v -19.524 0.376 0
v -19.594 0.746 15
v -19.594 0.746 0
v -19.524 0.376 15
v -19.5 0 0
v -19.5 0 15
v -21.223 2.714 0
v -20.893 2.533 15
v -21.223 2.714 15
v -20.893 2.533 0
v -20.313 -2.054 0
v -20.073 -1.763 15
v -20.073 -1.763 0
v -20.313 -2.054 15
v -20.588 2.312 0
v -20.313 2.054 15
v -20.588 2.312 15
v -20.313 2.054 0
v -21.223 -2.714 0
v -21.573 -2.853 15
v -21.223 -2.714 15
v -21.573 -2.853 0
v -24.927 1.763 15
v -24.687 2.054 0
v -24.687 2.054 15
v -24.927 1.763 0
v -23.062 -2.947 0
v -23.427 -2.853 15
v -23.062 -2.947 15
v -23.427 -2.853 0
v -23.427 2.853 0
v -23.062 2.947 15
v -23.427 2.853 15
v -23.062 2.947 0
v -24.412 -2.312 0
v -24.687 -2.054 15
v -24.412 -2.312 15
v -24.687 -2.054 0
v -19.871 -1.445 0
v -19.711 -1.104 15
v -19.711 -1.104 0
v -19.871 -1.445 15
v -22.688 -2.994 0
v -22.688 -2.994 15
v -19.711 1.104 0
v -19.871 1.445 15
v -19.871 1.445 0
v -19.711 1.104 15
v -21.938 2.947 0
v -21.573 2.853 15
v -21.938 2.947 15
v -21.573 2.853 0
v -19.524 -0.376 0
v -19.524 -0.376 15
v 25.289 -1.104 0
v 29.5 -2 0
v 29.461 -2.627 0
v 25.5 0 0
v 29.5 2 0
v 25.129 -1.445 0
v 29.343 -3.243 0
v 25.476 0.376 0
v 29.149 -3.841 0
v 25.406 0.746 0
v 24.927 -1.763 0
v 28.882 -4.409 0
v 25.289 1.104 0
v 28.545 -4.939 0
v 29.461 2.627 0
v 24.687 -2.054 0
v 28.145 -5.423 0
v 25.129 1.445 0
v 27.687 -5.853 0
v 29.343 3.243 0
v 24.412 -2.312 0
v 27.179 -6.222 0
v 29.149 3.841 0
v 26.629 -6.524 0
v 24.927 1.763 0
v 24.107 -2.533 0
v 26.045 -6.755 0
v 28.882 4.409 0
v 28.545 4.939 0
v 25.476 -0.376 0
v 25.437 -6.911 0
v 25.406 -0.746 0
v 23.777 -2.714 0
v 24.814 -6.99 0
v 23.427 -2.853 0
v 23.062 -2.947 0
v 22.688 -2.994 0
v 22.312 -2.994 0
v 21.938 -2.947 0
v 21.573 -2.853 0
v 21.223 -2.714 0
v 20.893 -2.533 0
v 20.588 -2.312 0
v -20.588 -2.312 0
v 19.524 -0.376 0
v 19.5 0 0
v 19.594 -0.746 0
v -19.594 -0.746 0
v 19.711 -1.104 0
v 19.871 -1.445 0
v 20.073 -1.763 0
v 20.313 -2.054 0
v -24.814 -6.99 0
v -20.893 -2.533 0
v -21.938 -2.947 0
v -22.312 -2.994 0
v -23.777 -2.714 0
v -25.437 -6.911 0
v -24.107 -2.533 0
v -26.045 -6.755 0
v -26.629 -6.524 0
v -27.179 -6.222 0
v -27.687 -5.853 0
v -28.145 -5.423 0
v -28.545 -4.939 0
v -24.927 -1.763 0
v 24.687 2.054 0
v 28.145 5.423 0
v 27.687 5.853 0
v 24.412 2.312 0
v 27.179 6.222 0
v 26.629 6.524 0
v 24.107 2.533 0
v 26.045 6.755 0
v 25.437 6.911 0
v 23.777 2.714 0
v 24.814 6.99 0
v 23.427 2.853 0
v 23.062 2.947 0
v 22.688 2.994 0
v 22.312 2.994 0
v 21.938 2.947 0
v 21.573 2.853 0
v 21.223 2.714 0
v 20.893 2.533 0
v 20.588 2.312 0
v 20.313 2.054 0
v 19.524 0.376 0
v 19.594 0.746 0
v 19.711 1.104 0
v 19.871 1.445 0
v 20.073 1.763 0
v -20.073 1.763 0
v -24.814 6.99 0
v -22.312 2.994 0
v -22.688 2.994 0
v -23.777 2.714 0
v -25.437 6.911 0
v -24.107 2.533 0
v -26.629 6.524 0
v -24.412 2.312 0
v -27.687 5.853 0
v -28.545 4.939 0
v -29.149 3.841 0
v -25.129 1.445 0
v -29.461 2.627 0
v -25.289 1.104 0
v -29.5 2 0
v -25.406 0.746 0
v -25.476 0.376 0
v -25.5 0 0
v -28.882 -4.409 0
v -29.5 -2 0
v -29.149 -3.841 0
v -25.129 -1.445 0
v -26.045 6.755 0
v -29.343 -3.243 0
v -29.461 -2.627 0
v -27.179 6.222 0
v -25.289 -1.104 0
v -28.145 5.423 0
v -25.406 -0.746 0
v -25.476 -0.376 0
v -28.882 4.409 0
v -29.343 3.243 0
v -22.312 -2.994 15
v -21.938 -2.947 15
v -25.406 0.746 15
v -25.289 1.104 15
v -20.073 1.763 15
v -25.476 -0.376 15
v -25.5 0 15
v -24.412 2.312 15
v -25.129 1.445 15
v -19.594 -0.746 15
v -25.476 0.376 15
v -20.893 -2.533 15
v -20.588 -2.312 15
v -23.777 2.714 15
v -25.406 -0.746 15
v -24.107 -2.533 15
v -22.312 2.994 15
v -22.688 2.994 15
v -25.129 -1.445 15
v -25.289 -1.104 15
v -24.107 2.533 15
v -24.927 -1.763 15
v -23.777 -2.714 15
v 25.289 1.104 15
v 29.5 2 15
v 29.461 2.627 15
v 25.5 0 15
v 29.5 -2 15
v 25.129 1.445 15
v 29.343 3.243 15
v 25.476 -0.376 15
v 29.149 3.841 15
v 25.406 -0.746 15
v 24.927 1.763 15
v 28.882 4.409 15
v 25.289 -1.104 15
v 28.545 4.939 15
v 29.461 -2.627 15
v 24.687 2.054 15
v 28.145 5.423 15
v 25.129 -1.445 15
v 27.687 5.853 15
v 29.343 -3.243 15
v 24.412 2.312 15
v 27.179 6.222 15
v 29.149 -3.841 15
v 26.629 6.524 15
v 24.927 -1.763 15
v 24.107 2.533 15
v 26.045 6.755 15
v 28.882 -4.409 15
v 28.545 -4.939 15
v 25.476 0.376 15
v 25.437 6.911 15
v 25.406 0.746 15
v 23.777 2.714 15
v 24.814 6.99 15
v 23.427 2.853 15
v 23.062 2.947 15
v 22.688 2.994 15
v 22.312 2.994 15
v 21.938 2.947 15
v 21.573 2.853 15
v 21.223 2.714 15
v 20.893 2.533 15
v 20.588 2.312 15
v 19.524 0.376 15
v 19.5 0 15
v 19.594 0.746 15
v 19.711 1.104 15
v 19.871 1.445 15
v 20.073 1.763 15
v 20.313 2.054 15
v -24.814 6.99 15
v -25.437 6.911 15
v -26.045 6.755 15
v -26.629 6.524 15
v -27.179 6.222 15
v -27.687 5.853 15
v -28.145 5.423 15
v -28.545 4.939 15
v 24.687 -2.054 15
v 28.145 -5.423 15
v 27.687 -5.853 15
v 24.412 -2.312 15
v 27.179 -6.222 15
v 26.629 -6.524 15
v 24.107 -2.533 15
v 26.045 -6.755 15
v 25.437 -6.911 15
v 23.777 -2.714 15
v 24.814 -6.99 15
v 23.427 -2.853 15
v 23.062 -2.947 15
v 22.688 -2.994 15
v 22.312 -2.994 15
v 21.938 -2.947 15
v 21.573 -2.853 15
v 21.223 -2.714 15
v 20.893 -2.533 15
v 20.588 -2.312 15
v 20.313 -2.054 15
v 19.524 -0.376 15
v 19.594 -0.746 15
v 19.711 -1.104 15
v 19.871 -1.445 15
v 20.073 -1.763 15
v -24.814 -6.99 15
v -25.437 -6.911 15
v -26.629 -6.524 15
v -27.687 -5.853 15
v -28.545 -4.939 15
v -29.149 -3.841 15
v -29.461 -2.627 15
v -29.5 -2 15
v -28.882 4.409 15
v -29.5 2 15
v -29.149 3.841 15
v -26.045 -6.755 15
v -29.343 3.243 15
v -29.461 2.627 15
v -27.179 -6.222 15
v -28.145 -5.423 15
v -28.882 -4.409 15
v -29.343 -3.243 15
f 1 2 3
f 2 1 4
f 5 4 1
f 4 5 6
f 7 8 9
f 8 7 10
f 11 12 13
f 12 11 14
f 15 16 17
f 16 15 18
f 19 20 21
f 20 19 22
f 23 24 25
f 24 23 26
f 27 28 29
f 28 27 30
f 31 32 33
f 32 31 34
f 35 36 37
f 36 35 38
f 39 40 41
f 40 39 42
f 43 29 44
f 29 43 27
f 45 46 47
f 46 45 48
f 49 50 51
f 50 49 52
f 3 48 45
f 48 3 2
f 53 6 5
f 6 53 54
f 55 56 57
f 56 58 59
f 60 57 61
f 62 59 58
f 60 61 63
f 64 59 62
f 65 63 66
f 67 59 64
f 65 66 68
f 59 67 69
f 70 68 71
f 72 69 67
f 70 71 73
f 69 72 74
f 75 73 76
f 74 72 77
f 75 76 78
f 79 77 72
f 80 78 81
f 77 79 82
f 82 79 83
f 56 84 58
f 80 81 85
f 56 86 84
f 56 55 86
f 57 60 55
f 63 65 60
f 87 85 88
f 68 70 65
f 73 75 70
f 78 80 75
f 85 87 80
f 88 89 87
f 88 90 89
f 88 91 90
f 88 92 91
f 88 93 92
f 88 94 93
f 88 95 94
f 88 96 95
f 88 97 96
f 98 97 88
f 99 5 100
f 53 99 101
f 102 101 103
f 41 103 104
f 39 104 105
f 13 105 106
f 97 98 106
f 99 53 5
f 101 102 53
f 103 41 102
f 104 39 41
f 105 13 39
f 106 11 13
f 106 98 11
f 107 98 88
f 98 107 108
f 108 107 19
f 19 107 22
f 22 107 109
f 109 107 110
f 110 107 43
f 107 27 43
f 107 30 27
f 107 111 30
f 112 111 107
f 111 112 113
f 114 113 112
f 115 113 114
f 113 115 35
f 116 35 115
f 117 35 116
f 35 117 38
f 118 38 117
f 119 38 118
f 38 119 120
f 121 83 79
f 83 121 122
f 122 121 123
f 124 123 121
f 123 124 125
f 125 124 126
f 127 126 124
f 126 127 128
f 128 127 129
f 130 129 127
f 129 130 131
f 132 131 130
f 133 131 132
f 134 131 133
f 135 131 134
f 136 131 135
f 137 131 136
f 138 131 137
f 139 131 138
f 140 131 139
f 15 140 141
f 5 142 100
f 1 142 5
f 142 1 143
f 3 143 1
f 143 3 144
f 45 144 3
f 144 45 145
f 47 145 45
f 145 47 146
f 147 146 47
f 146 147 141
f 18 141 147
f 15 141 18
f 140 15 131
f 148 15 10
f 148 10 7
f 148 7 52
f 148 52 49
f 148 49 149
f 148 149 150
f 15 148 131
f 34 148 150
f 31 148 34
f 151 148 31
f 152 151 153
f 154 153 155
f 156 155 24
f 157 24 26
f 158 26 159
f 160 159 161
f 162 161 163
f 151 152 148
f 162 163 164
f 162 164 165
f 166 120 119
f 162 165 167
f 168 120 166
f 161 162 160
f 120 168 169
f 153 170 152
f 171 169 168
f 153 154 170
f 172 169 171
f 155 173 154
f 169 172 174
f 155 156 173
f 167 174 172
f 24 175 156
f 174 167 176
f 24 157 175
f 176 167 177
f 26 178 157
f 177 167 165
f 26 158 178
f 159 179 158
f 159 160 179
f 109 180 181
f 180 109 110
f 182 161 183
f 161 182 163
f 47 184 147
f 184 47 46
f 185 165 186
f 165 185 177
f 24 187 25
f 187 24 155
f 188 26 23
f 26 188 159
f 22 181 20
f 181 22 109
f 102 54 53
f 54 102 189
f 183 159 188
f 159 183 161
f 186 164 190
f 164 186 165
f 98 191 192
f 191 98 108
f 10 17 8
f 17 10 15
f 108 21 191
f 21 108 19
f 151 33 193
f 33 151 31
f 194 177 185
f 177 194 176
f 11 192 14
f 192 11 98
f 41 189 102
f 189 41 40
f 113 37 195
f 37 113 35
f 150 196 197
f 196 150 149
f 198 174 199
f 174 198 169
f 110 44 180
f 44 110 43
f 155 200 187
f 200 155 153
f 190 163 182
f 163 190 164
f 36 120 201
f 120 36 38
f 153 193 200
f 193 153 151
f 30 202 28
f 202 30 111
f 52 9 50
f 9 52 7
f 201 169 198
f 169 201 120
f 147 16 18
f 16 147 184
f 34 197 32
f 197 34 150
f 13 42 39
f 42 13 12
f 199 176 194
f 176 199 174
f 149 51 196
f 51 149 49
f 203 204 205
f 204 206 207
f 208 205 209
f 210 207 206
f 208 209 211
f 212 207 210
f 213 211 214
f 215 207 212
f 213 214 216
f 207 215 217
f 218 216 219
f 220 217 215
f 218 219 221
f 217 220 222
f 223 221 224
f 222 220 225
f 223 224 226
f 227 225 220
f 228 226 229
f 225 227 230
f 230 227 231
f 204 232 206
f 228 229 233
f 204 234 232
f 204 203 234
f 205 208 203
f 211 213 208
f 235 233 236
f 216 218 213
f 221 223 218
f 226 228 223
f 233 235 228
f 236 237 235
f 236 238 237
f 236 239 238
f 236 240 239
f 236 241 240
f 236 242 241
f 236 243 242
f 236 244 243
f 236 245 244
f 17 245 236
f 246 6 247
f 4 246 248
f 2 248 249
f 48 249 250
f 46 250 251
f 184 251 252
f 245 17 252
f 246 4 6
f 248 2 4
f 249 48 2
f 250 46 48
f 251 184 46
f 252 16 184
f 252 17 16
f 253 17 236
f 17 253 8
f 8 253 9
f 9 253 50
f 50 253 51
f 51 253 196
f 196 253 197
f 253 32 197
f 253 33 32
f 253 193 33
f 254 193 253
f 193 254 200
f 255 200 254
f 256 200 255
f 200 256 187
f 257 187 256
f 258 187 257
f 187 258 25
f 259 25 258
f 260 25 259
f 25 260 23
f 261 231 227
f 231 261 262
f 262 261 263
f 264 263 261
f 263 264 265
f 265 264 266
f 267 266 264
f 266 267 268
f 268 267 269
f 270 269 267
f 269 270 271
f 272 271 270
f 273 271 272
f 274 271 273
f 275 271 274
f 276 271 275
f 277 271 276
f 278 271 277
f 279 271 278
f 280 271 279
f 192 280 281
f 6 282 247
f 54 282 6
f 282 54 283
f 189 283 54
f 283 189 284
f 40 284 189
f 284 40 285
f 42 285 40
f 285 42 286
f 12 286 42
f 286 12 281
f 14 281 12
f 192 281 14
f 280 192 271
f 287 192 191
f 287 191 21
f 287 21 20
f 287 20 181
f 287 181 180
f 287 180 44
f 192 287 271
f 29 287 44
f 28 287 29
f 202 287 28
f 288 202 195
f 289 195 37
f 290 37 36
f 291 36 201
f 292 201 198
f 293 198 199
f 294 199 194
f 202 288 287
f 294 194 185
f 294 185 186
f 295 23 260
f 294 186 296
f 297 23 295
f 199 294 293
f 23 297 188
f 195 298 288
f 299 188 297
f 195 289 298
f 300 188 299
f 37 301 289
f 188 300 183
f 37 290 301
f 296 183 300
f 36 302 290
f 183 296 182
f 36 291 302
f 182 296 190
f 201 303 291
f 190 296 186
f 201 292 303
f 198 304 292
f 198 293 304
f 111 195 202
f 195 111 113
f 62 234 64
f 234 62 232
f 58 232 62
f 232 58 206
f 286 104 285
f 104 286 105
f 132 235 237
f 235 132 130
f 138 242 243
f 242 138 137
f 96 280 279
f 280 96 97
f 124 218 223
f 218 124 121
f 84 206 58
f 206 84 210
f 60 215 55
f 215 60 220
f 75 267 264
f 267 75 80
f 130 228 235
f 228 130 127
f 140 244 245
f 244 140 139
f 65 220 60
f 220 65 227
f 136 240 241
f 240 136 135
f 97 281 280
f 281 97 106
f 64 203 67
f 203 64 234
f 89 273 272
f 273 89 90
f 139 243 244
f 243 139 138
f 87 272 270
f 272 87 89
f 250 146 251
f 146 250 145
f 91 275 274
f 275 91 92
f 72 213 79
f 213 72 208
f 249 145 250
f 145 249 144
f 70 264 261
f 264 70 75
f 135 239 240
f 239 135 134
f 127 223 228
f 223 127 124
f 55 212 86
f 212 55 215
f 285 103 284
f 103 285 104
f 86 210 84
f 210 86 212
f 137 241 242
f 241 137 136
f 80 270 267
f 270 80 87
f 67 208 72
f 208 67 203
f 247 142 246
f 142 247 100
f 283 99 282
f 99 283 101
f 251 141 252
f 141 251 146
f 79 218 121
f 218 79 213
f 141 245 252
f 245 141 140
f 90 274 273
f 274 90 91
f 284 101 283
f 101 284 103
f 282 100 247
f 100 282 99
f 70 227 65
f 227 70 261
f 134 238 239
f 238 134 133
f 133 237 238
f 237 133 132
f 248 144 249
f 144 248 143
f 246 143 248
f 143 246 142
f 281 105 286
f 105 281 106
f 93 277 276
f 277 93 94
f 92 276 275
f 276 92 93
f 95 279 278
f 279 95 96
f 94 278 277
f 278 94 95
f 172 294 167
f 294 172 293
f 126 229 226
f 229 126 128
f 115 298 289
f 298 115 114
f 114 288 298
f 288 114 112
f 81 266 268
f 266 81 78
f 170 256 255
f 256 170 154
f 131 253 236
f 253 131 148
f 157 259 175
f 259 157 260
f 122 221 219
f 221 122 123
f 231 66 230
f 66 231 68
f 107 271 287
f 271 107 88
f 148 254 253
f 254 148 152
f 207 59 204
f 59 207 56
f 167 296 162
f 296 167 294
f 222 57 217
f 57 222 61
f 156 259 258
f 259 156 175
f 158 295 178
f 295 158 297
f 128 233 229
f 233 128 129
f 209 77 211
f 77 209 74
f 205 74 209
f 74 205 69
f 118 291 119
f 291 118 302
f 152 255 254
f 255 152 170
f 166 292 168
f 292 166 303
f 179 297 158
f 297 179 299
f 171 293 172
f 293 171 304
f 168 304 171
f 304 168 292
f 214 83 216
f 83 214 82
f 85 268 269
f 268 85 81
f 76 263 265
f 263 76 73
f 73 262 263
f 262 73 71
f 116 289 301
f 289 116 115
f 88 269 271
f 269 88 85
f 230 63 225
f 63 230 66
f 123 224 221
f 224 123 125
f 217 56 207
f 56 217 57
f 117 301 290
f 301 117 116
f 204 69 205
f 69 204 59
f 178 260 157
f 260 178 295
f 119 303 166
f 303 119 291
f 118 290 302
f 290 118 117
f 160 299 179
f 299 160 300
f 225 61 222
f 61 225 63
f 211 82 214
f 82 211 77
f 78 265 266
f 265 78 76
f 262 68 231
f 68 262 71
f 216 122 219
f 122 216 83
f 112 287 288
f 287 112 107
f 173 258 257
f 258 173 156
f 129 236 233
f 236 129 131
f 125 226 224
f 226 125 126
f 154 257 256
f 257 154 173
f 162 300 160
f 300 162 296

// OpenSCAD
$fn = 50;


difference() {
	union() {
		hull() {
			translate(v = [-24.5000000000, 2.0000000000, 0]) {
				cylinder(h = 15, r = 5);
			}
			translate(v = [24.5000000000, 2.0000000000, 0]) {
				cylinder(h = 15, r = 5);
			}
			translate(v = [-24.5000000000, -2.0000000000, 0]) {
				cylinder(h = 15, r = 5);
			}
			translate(v = [24.5000000000, -2.0000000000, 0]) {
				cylinder(h = 15, r = 5);
			}
		}
	}
	union() {
		translate(v = [-22.5000000000, 0.0000000000, 0]) {
			cylinder(h = 15, r = 3.0000000000);
		}
		translate(v = [22.5000000000, 0.0000000000, 0]) {
			cylinder(h = 15, r = 3.0000000000);
		}
		translate(v = [-22.5000000000, 0.0000000000, 0]) {
			cylinder(h = 15, r = 1.5000000000);
		}
		translate(v = [22.5000000000, 0.0000000000, 0]) {
			cylinder(h = 15, r = 1.5000000000);
		}
		translate(v = [-22.5000000000, 0.0000000000, 0]) {
			cylinder(h = 15, r = 1.5000000000);
		}
		translate(v = [22.5000000000, 0.0000000000, 0]) {
			cylinder(h = 15, r = 1.5000000000);
		}
		translate(v = [-22.5000000000, 0.0000000000, 0]) {
			cylinder(h = 15, r = 1.5000000000);
		}
		translate(v = [22.5000000000, 0.0000000000, 0]) {
			cylinder(h = 15, r = 1.5000000000);
		}
	}
}
